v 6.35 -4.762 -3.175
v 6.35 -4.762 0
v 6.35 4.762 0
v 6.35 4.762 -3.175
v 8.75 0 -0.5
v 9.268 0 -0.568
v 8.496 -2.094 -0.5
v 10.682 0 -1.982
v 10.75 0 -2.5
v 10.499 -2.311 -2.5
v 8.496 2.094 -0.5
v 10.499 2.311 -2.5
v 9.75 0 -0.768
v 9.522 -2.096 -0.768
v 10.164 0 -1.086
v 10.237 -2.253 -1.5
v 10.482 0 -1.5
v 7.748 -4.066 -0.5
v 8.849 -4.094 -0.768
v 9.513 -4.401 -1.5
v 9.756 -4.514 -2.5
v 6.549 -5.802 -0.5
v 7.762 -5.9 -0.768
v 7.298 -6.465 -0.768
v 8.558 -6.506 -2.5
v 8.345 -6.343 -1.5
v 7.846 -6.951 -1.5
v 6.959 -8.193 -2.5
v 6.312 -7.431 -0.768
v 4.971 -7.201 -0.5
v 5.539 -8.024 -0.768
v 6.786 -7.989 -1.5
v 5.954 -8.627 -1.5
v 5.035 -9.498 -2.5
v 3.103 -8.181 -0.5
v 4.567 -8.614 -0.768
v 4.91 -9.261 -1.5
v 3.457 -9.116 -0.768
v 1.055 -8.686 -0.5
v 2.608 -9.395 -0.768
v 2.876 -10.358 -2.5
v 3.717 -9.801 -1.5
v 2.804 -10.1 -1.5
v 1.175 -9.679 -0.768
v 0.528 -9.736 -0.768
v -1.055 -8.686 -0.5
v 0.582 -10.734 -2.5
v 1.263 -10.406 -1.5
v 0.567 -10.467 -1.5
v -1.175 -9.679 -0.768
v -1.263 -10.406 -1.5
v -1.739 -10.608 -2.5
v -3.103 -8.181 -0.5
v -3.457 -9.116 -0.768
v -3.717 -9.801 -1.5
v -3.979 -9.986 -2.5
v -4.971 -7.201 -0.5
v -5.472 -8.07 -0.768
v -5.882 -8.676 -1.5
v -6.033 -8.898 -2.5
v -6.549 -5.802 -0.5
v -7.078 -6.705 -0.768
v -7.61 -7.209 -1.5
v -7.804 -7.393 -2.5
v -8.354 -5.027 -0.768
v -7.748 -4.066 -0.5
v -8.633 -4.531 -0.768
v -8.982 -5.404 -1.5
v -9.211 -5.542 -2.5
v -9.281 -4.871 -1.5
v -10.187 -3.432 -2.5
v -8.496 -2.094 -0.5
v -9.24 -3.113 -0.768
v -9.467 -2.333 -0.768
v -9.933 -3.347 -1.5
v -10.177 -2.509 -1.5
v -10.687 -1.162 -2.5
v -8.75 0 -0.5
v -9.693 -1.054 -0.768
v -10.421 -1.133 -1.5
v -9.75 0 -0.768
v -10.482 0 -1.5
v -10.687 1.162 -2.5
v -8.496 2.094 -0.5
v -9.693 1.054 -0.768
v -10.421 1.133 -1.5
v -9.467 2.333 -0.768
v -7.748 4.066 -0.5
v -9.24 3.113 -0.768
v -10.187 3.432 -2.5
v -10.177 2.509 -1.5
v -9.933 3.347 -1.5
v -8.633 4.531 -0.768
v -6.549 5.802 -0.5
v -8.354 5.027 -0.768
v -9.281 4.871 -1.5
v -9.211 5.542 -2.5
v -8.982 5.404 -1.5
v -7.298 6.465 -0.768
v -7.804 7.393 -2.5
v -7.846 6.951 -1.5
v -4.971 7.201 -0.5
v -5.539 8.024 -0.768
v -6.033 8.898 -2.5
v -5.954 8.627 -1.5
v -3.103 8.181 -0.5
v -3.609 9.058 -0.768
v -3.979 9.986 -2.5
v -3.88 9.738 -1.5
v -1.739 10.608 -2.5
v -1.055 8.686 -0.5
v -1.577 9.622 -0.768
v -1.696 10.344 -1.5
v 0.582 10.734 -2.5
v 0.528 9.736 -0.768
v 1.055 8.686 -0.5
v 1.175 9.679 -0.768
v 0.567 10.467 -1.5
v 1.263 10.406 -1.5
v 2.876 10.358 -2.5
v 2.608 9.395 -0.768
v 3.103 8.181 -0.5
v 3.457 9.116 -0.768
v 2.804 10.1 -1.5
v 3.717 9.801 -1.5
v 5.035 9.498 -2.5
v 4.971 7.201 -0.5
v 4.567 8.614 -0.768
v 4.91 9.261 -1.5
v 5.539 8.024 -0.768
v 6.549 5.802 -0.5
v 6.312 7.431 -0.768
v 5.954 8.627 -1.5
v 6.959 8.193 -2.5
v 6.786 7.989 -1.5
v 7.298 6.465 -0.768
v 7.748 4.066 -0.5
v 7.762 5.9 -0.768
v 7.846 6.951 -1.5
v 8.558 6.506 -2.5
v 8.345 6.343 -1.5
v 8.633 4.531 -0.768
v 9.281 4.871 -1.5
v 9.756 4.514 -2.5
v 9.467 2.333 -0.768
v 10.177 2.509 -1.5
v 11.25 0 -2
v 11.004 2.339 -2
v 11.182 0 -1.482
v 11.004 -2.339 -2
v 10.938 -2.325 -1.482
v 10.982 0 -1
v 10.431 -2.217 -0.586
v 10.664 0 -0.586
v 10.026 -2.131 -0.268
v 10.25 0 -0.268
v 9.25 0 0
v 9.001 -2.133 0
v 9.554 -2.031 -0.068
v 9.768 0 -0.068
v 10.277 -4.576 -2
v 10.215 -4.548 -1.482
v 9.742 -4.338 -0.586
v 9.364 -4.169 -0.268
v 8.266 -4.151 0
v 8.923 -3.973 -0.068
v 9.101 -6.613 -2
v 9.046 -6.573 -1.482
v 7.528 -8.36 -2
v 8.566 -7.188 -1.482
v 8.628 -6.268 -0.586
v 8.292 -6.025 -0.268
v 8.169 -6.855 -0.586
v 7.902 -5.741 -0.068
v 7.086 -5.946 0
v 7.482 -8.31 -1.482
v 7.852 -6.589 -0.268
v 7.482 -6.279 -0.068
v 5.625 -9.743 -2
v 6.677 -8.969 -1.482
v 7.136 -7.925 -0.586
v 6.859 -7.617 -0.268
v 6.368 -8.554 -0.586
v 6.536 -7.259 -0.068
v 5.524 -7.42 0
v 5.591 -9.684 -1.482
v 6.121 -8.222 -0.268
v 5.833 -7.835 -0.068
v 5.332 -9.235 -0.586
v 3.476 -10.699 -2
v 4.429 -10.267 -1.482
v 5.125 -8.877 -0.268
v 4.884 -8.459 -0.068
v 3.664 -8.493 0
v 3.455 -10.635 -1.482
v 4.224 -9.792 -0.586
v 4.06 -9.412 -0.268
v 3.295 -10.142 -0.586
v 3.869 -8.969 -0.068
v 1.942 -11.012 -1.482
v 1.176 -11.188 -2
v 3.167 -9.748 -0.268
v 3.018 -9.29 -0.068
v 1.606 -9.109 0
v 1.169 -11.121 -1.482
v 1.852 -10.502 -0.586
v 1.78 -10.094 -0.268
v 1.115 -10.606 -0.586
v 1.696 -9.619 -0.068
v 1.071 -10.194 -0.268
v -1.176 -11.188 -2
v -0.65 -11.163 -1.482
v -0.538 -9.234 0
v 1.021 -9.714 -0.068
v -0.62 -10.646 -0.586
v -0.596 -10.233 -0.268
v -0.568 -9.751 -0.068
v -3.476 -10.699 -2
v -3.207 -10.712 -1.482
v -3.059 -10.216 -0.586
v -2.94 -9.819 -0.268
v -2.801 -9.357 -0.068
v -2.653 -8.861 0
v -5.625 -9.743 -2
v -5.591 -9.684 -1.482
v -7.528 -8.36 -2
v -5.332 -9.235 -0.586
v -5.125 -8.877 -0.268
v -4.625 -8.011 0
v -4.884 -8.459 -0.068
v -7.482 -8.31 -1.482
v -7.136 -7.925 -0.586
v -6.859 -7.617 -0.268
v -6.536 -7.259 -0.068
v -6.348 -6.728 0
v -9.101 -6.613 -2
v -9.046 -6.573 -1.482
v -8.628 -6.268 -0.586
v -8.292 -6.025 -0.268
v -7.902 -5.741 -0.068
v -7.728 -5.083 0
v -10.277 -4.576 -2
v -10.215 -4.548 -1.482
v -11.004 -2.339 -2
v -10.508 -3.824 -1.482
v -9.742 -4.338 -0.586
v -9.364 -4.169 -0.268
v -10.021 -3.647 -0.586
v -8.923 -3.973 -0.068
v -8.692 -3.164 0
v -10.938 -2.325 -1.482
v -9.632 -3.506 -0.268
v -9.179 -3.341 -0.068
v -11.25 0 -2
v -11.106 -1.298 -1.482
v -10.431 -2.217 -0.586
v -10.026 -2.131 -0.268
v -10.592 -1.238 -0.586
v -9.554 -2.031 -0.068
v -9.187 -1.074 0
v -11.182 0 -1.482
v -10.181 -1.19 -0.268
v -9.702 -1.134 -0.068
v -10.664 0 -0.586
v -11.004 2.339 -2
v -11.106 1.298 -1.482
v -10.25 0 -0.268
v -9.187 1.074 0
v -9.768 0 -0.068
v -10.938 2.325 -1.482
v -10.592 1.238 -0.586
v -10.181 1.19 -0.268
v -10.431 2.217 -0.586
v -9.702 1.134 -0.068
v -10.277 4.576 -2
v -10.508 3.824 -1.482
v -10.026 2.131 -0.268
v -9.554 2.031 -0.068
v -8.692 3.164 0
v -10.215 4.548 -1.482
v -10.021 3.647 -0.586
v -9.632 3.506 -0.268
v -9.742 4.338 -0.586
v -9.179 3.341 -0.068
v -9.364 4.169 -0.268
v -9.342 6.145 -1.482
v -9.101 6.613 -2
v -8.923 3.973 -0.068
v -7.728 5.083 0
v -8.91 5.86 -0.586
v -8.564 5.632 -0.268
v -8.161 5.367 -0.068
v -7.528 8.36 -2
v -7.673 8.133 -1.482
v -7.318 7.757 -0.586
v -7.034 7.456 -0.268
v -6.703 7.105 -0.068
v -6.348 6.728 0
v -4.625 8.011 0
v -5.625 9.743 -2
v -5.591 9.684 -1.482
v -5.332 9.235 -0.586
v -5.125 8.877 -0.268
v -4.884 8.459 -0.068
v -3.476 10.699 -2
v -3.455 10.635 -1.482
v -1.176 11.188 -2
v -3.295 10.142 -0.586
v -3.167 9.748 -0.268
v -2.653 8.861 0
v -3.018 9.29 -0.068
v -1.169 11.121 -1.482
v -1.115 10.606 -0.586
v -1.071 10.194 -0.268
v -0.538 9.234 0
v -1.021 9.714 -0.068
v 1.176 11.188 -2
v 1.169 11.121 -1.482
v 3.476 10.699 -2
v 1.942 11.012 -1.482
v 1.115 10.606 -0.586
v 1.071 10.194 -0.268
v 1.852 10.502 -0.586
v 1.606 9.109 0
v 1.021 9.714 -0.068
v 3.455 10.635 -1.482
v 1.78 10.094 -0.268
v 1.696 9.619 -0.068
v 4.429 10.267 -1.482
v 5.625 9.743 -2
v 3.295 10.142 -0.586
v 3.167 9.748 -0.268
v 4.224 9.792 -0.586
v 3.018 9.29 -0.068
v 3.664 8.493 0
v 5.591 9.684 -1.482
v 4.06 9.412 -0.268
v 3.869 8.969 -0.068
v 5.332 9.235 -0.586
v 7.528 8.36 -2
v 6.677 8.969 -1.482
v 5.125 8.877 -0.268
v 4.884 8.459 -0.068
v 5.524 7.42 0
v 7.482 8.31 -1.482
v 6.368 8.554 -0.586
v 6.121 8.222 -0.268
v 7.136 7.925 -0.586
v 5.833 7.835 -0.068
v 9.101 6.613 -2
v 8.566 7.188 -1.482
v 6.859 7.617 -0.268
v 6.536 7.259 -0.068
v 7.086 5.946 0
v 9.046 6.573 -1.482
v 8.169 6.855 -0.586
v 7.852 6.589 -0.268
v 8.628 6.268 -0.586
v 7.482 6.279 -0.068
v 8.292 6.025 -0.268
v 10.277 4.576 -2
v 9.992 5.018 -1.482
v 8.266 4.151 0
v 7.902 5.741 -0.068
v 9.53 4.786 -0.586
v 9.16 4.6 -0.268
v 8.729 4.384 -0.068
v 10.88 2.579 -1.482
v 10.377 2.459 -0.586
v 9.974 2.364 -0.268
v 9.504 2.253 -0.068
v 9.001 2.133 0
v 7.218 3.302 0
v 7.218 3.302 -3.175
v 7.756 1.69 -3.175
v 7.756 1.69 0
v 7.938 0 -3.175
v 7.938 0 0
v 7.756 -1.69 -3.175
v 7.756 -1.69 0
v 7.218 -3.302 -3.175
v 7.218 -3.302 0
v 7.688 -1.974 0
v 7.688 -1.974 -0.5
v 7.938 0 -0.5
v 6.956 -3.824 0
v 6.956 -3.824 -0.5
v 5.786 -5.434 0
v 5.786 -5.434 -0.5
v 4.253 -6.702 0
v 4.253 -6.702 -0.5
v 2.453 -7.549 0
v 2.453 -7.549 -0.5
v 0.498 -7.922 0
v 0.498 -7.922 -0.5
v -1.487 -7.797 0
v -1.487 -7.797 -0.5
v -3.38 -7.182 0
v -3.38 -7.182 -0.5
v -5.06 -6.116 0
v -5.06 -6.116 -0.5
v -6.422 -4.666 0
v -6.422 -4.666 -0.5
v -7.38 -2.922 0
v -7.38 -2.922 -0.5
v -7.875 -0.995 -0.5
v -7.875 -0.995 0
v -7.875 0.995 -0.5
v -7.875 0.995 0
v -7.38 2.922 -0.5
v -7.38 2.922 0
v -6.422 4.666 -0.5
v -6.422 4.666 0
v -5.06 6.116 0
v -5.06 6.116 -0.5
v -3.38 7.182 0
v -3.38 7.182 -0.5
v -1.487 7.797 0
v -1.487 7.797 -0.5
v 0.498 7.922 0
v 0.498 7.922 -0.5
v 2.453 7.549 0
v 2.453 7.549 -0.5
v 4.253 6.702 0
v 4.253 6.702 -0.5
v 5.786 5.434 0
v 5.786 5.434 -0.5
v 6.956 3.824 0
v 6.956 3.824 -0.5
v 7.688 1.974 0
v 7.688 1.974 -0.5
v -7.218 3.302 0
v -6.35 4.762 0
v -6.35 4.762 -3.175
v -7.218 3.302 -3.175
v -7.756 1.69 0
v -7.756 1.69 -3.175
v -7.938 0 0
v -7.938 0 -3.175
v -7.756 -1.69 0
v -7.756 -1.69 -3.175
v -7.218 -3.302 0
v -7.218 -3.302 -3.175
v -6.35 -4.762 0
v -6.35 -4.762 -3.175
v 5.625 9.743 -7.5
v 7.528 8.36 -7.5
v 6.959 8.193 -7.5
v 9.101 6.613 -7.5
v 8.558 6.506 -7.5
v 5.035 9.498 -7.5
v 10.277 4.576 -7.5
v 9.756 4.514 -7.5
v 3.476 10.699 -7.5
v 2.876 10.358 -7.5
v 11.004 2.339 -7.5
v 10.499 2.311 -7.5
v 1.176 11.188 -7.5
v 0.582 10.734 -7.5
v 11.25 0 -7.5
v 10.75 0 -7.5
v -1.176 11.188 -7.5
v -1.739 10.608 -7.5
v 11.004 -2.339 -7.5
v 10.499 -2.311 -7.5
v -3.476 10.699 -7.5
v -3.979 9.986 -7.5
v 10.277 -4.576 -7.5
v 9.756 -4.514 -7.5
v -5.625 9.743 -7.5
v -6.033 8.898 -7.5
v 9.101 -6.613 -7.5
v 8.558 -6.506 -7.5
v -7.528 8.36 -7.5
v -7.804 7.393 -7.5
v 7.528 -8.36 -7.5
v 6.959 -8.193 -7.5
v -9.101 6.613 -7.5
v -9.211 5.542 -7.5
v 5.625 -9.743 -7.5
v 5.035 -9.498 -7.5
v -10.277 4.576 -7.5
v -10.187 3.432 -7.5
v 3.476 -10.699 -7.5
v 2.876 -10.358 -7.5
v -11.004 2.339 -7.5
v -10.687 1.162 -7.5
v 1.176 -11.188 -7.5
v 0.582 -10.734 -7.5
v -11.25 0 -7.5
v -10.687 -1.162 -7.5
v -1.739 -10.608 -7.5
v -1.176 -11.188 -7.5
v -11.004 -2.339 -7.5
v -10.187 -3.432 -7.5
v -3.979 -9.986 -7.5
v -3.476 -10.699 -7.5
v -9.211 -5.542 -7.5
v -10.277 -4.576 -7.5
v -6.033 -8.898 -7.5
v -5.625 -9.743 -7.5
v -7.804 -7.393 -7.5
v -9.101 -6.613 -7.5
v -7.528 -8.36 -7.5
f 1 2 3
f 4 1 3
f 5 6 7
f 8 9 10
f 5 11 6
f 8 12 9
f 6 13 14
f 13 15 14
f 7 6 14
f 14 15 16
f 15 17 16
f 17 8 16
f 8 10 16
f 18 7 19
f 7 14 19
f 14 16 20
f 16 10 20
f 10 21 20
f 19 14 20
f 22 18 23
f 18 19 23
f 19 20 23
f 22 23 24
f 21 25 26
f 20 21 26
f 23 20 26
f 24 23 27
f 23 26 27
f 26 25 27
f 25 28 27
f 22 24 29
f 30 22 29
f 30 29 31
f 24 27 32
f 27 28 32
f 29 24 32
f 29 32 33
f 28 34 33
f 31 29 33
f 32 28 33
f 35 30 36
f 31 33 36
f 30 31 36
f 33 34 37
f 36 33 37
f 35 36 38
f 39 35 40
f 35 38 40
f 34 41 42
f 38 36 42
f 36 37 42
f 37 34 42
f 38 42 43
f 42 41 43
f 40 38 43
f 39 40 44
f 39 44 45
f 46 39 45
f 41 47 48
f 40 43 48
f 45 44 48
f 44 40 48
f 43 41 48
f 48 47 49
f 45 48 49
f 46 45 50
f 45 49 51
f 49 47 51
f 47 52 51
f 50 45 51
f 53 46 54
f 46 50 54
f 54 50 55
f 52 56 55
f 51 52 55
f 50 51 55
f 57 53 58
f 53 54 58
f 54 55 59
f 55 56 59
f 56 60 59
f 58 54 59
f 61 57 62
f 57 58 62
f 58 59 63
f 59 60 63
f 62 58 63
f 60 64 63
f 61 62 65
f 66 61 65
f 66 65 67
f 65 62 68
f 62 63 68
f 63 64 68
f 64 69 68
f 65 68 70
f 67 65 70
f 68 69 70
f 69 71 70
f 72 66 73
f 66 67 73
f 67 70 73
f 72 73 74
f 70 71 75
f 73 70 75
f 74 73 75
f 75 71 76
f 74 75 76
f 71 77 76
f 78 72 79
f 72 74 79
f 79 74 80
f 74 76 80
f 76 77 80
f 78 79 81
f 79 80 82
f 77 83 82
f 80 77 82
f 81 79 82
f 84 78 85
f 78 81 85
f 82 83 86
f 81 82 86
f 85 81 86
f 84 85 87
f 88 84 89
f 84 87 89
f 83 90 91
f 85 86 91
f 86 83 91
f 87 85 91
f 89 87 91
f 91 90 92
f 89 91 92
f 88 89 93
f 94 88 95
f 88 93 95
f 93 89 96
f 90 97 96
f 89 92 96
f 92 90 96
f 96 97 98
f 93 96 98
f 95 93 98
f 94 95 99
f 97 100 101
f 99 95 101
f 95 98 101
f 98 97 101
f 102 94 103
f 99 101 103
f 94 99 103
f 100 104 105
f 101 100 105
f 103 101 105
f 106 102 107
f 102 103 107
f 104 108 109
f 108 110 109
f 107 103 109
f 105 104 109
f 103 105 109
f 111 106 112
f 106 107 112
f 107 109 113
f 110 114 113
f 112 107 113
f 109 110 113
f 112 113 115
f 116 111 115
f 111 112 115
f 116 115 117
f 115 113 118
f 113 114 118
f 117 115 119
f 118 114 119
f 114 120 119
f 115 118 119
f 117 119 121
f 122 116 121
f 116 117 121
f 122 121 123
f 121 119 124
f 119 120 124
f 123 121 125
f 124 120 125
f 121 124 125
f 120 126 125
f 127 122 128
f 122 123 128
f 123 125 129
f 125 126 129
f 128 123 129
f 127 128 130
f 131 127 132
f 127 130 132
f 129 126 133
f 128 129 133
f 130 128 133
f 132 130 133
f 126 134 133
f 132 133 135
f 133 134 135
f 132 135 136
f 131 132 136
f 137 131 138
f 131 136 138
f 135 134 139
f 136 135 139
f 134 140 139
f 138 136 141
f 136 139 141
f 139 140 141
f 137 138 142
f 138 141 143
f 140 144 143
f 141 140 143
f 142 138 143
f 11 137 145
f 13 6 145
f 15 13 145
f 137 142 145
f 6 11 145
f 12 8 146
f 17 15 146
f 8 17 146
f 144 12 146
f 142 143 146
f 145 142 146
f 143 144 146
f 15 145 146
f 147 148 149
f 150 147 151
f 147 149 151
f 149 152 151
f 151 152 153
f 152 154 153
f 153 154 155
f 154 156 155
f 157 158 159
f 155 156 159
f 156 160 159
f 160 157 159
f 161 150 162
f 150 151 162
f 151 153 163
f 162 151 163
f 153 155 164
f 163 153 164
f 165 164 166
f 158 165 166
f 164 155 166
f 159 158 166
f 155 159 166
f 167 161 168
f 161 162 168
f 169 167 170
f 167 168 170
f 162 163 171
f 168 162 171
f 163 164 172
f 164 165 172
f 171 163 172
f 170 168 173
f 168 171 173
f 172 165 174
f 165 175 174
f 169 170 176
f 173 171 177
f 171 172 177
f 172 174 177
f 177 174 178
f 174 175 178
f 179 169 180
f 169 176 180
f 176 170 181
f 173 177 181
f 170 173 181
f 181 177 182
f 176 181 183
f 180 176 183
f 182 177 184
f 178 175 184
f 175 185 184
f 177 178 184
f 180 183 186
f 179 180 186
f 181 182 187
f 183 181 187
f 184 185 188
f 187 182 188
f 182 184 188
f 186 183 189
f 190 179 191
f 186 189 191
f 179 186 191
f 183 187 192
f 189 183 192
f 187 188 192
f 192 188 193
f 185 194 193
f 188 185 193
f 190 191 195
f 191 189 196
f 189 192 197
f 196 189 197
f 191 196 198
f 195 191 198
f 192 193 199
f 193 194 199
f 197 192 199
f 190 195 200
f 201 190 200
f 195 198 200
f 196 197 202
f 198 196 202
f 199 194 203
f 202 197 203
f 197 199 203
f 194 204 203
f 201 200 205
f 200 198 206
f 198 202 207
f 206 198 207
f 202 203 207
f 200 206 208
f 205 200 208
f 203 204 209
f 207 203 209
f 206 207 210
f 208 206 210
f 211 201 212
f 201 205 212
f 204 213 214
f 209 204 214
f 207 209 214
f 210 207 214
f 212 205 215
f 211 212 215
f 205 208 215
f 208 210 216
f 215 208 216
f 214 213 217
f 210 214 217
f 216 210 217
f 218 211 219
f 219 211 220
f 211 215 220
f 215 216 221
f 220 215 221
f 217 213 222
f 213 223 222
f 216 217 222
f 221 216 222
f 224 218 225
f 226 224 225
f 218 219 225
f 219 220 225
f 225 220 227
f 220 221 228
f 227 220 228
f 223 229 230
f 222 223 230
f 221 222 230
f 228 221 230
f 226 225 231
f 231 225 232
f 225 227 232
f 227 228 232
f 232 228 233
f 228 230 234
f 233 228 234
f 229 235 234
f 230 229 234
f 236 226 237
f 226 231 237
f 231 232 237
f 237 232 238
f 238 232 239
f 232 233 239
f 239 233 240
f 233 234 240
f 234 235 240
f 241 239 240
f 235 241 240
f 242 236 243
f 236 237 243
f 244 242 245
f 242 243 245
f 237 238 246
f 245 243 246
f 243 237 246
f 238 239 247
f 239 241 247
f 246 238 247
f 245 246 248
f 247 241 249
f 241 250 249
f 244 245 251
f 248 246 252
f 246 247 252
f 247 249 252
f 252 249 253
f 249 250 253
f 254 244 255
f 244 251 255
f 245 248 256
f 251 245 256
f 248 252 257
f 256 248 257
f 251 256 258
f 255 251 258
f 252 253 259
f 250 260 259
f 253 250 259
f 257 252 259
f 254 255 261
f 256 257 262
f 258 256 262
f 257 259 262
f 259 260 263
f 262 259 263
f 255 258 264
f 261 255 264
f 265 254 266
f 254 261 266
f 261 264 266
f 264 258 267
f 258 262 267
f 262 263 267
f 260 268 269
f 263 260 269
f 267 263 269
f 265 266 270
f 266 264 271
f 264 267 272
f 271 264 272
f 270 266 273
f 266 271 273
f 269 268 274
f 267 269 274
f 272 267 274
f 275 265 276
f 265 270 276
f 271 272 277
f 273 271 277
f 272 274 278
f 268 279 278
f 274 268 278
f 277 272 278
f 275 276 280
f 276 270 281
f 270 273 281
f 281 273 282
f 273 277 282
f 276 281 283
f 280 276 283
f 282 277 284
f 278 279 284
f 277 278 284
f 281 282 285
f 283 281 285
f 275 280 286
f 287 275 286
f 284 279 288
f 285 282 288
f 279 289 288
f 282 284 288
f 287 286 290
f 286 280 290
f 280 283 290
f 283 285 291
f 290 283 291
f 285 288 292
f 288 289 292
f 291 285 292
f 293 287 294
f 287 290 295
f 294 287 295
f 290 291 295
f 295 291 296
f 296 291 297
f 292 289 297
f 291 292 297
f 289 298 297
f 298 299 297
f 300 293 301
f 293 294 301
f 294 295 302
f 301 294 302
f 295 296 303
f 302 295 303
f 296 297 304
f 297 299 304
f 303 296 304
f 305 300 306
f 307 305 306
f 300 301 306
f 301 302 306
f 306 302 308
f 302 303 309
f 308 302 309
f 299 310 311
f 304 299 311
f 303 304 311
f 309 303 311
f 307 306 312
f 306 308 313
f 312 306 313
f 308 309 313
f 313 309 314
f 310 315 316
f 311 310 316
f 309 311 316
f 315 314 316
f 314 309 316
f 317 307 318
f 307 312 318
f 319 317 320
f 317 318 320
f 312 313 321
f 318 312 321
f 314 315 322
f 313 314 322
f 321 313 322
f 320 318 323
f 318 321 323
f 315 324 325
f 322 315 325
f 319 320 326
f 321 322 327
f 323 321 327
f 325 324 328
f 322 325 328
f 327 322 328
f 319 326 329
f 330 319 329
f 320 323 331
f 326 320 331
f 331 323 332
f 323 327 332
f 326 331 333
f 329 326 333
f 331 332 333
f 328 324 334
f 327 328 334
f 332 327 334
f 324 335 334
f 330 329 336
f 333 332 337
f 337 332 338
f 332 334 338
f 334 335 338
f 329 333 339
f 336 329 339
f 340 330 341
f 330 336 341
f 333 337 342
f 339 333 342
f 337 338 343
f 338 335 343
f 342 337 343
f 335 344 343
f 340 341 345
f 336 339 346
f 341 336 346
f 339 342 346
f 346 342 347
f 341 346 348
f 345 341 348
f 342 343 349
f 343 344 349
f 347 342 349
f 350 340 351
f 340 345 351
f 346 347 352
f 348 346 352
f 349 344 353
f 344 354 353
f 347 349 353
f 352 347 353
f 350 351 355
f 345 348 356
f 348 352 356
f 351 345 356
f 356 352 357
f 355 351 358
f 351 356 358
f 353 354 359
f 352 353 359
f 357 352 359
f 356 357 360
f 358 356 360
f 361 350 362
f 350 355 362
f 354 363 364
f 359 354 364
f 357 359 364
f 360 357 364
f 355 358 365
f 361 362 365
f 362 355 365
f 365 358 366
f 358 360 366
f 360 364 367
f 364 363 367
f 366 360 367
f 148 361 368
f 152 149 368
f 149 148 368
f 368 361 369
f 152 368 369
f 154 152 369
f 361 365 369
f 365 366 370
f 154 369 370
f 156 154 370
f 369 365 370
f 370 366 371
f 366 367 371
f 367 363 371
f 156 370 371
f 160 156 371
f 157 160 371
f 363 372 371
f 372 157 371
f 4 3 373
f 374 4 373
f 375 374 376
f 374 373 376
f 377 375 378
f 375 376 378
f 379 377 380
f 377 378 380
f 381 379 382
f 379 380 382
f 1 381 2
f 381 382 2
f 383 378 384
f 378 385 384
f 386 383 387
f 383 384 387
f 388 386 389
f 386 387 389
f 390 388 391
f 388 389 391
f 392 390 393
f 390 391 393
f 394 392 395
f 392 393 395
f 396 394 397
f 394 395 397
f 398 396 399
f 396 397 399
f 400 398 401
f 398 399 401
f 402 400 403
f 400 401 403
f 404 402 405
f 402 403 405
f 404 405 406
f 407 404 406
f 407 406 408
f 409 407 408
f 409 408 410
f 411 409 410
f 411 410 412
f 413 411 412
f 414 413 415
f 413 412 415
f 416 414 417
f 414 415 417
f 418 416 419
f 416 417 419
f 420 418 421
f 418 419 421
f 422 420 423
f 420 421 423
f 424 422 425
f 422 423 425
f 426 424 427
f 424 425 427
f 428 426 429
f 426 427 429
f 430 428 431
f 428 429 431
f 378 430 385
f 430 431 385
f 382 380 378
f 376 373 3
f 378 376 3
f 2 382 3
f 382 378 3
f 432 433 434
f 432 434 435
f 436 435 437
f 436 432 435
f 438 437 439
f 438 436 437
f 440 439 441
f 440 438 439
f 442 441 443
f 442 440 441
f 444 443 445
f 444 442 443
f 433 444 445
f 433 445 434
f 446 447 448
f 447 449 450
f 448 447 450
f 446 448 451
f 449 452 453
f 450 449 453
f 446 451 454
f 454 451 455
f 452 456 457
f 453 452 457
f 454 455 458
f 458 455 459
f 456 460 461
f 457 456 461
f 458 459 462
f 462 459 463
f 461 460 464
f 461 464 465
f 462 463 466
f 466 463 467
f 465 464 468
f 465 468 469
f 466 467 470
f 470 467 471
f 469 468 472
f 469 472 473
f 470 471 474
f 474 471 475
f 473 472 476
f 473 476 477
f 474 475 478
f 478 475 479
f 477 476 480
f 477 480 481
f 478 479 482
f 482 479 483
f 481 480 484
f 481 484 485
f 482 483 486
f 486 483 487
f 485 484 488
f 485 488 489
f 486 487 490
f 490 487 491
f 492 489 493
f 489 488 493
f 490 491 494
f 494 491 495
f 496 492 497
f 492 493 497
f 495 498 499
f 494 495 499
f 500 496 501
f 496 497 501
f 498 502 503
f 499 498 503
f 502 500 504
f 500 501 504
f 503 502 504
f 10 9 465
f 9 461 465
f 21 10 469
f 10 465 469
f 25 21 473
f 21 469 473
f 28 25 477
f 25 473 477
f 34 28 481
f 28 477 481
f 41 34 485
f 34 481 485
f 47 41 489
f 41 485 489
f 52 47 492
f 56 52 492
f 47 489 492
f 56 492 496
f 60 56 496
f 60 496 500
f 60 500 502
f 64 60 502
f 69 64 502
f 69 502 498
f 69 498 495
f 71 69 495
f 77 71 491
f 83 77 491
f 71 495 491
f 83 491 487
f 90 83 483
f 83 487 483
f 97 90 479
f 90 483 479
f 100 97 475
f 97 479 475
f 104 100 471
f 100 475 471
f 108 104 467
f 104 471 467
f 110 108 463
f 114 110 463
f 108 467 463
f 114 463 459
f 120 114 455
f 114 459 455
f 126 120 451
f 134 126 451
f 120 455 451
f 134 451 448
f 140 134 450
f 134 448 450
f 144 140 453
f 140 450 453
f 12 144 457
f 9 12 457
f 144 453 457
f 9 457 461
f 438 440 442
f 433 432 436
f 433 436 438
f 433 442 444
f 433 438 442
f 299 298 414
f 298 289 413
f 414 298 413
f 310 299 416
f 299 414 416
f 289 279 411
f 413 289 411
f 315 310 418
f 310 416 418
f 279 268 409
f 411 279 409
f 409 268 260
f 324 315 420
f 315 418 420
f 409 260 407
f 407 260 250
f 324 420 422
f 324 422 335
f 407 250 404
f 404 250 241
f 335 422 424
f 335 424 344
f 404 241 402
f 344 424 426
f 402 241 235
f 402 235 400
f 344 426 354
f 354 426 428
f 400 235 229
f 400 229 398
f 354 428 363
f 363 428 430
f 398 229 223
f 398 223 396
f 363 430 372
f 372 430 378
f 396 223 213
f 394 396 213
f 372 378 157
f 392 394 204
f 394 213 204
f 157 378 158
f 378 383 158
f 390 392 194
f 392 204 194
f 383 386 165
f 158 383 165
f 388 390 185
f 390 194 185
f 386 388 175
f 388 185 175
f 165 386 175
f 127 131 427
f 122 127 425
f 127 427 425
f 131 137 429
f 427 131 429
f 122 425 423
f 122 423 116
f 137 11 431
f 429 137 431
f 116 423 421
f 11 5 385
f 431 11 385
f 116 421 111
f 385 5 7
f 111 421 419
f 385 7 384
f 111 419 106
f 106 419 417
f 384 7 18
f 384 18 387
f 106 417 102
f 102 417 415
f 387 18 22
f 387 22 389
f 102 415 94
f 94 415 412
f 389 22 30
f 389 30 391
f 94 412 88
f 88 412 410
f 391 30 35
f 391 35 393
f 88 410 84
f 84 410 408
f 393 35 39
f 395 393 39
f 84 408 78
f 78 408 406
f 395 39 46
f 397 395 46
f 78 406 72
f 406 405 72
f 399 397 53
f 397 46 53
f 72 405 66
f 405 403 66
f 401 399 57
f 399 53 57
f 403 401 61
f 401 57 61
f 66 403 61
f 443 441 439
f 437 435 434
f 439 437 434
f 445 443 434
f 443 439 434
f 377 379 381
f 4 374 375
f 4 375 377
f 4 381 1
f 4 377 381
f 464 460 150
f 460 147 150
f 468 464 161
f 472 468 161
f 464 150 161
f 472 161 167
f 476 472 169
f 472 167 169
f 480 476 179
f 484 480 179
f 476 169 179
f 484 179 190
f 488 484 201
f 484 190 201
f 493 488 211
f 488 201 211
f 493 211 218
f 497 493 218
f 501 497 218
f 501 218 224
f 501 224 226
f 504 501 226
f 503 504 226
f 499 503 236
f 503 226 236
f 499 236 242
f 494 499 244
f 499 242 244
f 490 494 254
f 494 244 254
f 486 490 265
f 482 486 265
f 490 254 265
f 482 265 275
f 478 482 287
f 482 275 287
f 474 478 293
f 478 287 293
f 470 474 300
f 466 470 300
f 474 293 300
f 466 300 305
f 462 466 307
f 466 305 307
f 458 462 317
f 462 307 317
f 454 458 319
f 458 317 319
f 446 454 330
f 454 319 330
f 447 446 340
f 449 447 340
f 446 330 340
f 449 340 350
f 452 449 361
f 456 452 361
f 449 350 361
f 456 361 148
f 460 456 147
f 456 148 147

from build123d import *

# Parameters (mm, degrees)
F2_DEPTH = 3.175


with BuildPart() as f2:
    # F0 (on Top) → F2 (new body)
    with BuildSketch(Plane.XY):
        with BuildLine():
            Line((-6.35, -4.7625), (-6.35, 4.7625))
            ThreePointArc((-6.35, 4.7625), (-7.9375, 0), (-6.35, -4.7625))
        make_face()
    extrude(amount=-F2_DEPTH)


with BuildPart() as f3_1:
    # F3: instance of F2
    add(f2.part.mirror(Plane.YZ))


with BuildPart() as f4:
    # F1 (on Front) → F4 (revolve)
    with BuildSketch(Plane.XZ):
        with BuildLine():
            Line((9.25, 0), (7.9375, 0))
            Line((7.9375, 0), (7.9375, -0.5))
            Line((7.9375, -0.5), (8.75, -0.5))
            ThreePointArc((8.75, -0.5), (10.164214, -1.085786), (10.75, -2.5))
            Line((10.75, -2.5), (10.75, -7.5))
            Line((10.75, -7.5), (11.25, -7.5))
            Line((11.25, -7.5), (11.25, -2))
            ThreePointArc((11.25, -2), (10.664214, -0.585786), (9.25, 0))
        make_face()
    revolve(axis=Axis((0, 0, -3.75), (0, 0, -1)))


solid = Compound([f2.part, f3_1.part, f4.part])
